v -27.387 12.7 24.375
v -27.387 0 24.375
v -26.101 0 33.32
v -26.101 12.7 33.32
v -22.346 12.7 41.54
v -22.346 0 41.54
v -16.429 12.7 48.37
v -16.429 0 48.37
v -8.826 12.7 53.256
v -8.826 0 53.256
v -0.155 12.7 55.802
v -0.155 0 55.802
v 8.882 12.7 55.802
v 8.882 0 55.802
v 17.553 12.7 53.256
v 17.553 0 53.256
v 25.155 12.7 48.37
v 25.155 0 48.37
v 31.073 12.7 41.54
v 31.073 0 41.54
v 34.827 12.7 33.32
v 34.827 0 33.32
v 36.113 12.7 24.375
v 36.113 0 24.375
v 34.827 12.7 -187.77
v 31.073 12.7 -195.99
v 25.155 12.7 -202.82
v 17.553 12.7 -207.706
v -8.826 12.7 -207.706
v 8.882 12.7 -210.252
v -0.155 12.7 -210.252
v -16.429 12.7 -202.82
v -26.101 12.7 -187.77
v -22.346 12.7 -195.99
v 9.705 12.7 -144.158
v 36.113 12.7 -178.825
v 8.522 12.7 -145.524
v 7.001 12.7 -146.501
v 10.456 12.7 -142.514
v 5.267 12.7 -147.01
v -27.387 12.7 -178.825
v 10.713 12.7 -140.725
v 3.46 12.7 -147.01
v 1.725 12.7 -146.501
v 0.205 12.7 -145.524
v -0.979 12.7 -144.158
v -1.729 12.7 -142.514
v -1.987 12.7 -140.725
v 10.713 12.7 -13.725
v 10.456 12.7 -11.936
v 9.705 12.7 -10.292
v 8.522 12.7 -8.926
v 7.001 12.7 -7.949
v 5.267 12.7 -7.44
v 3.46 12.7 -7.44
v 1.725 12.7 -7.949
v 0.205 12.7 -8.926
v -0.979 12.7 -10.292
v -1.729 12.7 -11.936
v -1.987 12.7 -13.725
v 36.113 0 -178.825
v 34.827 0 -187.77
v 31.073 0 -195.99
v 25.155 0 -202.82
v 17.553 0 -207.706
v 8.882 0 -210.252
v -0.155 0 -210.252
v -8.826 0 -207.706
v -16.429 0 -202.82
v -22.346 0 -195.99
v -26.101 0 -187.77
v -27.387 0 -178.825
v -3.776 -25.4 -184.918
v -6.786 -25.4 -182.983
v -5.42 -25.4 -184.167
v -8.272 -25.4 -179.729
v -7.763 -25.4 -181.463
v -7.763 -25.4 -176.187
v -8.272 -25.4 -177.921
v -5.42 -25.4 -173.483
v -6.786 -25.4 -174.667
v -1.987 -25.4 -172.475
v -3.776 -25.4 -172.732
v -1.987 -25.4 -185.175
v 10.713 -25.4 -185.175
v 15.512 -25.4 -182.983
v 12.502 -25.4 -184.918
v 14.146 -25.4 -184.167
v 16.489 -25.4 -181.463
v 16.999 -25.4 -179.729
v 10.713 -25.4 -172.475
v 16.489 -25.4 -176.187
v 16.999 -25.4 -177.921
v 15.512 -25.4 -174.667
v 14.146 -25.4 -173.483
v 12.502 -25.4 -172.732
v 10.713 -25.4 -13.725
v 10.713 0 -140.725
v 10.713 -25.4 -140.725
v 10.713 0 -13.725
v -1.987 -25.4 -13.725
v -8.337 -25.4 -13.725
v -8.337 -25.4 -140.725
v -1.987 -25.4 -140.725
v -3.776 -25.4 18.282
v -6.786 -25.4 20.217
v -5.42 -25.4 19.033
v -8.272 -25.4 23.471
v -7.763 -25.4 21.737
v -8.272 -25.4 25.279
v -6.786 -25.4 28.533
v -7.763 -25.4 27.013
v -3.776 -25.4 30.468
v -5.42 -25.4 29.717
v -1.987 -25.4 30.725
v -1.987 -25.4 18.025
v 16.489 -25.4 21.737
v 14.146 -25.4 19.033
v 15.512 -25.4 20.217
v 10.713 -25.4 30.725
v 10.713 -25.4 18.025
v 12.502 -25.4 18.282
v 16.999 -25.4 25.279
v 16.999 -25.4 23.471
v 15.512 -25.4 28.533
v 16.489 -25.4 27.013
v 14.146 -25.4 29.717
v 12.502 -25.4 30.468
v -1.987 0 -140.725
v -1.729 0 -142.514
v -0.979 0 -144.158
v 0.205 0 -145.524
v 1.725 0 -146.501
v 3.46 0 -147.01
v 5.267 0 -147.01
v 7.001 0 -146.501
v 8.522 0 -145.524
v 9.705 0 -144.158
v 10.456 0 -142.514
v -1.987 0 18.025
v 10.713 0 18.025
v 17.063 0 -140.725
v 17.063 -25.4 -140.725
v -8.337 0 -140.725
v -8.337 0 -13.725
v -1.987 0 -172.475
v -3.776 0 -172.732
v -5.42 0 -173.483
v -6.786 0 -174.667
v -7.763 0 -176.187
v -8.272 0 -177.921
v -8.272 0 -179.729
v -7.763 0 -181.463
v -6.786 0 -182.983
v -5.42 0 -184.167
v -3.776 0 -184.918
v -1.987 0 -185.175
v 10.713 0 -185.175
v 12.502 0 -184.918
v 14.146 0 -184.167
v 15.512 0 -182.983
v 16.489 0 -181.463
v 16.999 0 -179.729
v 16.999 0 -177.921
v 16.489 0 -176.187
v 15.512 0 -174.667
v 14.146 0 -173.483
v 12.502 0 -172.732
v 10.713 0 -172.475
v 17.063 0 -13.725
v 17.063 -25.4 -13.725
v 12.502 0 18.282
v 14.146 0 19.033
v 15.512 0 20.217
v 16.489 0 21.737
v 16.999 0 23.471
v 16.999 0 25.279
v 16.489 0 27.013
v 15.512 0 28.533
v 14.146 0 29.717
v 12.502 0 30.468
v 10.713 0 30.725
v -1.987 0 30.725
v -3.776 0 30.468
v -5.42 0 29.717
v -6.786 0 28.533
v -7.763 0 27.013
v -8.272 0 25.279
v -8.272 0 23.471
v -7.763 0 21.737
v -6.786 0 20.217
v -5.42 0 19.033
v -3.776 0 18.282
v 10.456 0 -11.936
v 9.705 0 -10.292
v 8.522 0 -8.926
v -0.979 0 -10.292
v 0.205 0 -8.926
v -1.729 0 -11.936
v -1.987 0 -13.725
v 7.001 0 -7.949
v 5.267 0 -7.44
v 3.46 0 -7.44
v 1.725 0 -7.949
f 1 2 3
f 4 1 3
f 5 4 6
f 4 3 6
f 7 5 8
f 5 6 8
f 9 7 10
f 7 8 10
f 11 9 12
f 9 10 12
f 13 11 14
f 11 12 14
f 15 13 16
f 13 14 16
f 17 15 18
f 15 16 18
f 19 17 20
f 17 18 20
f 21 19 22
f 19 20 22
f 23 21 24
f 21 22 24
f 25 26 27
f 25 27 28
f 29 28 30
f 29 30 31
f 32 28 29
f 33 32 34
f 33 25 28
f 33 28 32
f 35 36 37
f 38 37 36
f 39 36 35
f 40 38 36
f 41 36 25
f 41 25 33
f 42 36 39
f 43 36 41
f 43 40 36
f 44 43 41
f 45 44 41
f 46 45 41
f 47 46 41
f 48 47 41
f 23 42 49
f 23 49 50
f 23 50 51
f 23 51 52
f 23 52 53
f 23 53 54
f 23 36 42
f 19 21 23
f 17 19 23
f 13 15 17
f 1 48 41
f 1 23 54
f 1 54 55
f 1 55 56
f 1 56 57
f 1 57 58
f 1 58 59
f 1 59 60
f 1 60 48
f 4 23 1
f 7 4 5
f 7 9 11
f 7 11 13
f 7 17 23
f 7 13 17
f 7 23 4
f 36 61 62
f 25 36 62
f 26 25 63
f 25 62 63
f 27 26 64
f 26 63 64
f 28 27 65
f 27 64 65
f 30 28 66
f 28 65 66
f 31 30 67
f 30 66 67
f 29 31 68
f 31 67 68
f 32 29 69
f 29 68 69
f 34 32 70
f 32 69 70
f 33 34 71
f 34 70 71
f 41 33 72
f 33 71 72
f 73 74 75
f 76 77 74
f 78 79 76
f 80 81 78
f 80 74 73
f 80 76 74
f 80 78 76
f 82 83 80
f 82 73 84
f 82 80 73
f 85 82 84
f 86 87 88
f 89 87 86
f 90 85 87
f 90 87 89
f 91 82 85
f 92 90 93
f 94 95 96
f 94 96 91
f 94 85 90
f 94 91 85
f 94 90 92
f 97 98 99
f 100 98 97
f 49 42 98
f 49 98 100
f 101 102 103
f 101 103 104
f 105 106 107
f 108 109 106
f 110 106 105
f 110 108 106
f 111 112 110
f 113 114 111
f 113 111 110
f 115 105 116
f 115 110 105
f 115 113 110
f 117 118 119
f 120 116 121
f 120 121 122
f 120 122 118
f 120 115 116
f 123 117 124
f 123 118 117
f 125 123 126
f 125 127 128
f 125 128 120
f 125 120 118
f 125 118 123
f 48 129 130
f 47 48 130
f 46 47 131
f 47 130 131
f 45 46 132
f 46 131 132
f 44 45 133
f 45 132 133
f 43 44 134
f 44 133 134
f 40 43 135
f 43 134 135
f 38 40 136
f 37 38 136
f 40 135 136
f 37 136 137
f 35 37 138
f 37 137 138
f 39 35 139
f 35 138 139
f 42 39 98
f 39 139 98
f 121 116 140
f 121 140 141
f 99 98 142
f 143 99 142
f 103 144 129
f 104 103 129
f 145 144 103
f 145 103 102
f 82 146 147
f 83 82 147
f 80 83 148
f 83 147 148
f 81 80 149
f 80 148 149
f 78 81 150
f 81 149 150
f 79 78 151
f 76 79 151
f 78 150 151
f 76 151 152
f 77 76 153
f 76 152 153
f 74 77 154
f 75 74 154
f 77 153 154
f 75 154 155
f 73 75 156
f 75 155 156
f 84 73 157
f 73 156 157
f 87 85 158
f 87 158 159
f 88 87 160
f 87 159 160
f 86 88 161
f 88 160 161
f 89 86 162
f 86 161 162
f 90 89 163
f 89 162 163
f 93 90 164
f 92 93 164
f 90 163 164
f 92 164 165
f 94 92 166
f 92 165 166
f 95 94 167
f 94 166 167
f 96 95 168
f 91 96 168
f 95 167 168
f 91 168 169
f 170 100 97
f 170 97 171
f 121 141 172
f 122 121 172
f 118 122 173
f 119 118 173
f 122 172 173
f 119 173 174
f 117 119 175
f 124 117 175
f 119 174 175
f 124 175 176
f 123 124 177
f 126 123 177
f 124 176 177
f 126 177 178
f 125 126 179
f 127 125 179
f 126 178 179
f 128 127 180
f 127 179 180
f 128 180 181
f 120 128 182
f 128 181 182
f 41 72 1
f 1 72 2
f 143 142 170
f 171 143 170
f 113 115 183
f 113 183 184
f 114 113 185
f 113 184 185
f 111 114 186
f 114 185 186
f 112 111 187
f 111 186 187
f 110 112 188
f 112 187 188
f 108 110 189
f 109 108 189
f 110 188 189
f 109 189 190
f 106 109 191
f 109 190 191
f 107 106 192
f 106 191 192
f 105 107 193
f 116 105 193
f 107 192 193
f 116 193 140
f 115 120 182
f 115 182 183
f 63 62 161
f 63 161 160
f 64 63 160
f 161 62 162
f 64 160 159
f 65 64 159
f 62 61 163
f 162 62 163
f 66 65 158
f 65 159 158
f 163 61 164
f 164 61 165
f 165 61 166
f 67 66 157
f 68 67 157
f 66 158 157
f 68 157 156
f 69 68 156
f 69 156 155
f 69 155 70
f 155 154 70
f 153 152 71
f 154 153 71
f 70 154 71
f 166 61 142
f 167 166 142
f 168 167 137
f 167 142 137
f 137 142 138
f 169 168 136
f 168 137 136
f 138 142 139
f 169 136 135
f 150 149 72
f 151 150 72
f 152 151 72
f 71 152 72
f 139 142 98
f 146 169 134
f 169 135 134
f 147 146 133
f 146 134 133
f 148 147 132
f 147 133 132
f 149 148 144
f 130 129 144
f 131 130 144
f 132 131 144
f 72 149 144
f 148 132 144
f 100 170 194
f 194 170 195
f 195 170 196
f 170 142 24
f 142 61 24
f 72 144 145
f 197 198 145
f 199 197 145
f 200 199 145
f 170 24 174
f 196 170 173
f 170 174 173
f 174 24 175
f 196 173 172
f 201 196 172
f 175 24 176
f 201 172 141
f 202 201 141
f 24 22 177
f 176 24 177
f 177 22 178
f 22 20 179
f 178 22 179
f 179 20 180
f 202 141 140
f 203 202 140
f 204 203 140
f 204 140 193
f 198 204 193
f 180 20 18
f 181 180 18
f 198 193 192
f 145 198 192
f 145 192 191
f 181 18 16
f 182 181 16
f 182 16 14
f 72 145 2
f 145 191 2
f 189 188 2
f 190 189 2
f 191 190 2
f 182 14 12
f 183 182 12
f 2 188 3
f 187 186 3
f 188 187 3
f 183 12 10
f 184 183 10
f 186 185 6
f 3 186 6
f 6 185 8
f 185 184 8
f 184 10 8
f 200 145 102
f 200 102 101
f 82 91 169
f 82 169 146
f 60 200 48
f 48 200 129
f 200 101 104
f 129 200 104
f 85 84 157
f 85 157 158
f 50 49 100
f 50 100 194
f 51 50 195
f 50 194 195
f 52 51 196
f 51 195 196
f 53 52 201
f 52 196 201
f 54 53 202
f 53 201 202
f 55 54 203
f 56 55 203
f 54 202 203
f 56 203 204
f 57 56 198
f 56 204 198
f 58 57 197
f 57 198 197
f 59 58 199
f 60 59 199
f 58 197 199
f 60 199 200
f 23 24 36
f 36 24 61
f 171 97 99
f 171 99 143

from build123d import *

# Parameters (mm, degrees)
F1_DEPTH = 25.4
F3_DEPTH = 12.7
F4_W     = 6.35
F4_H     = 127
F5_DEPTH = 25.4


with BuildPart() as f1:
    # F0 (on Front) → F1 (new body)
    with BuildSketch(Plane.XZ):
        with BuildLine():
            Line((10.7133227866, 30.7250145495), (-1.9866772134, 30.7250145495))
            ThreePointArc((-1.9866772134, 30.7250145495), (-8.3366772134, 24.3750145495), (-1.9866772134, 18.0250145495))
            Line((-1.9866772134, 18.0250145495), (10.7133227866, 18.0250145495))
            ThreePointArc((10.7133227866, 18.0250145495), (17.0633227866, 24.3750145495), (10.7133227866, 30.7250145495))
        make_face()
    extrude(amount=F1_DEPTH)



with BuildPart() as f1b:
    # F0 (on Front) → F1, piece 2 (new body)
    with BuildSketch(Plane.XZ):
        with BuildLine():
            Line((10.7133227866, -172.4749854505), (-1.9866772134, -172.4749854505))
            ThreePointArc((-1.9866772134, -172.4749854505), (-8.3366772134, -178.8249854505), (-1.9866772134, -185.1749854505))
            Line((-1.9866772134, -185.1749854505), (10.7133227866, -185.1749854505))
            ThreePointArc((10.7133227866, -185.1749854505), (17.0633227866, -178.8249854505), (10.7133227866, -172.4749854505))
        make_face()
    extrude(amount=F1_DEPTH)


with BuildPart() as f1_1:
    add(f1.part)

    add(f1b.part)  # F3 merges F1b
    # F2 (on face) → F3 (join)
    with BuildSketch(Plane(origin=(0, 0, 0), x_dir=(-1, 0, 0), z_dir=(0, 1, 0))):
        with BuildLine():
            ThreePointArc((27.3866772134, 24.3750145495), (-4.3633227866, 56.1250145495), (-36.1133227866, 24.3750145495))
            Line((-36.1133227866, 24.3750145495), (-36.1133227866, -178.8249854505))
            ThreePointArc((-36.1133227866, -178.8249854505), (-4.3633227866, -210.5749854505), (27.3866772134, -178.8249854505))
            Line((27.3866772134, -178.8249854505), (27.3866772134, 24.3750145495))
        make_face()
        with BuildLine():
            Line((-10.7133227866, -140.7249854505), (-10.7133227866, -13.7249854505))
            ThreePointArc((-10.7133227866, -13.7249854505), (-4.3633227866, -7.3749854505), (1.9866772134, -13.7249854505))
            Line((1.9866772134, -13.7249854505), (1.9866772134, -140.7249854505))
            ThreePointArc((1.9866772134, -140.7249854505), (-4.3633227866, -147.0749854505), (-10.7133227866, -140.7249854505))
        make_face(mode=Mode.SUBTRACT)
    extrude(amount=F3_DEPTH)

    # F4 (on face) → F5 (join)
    with BuildSketch(Plane.XZ):
        with Locations((13.8883227866, -77.2249854505)):
            Rectangle(F4_W, F4_H)
        with Locations((-5.1616772134, -77.2249854505)):
            Rectangle(F4_W, F4_H)
    extrude(amount=F5_DEPTH)


solid = f1_1.part
